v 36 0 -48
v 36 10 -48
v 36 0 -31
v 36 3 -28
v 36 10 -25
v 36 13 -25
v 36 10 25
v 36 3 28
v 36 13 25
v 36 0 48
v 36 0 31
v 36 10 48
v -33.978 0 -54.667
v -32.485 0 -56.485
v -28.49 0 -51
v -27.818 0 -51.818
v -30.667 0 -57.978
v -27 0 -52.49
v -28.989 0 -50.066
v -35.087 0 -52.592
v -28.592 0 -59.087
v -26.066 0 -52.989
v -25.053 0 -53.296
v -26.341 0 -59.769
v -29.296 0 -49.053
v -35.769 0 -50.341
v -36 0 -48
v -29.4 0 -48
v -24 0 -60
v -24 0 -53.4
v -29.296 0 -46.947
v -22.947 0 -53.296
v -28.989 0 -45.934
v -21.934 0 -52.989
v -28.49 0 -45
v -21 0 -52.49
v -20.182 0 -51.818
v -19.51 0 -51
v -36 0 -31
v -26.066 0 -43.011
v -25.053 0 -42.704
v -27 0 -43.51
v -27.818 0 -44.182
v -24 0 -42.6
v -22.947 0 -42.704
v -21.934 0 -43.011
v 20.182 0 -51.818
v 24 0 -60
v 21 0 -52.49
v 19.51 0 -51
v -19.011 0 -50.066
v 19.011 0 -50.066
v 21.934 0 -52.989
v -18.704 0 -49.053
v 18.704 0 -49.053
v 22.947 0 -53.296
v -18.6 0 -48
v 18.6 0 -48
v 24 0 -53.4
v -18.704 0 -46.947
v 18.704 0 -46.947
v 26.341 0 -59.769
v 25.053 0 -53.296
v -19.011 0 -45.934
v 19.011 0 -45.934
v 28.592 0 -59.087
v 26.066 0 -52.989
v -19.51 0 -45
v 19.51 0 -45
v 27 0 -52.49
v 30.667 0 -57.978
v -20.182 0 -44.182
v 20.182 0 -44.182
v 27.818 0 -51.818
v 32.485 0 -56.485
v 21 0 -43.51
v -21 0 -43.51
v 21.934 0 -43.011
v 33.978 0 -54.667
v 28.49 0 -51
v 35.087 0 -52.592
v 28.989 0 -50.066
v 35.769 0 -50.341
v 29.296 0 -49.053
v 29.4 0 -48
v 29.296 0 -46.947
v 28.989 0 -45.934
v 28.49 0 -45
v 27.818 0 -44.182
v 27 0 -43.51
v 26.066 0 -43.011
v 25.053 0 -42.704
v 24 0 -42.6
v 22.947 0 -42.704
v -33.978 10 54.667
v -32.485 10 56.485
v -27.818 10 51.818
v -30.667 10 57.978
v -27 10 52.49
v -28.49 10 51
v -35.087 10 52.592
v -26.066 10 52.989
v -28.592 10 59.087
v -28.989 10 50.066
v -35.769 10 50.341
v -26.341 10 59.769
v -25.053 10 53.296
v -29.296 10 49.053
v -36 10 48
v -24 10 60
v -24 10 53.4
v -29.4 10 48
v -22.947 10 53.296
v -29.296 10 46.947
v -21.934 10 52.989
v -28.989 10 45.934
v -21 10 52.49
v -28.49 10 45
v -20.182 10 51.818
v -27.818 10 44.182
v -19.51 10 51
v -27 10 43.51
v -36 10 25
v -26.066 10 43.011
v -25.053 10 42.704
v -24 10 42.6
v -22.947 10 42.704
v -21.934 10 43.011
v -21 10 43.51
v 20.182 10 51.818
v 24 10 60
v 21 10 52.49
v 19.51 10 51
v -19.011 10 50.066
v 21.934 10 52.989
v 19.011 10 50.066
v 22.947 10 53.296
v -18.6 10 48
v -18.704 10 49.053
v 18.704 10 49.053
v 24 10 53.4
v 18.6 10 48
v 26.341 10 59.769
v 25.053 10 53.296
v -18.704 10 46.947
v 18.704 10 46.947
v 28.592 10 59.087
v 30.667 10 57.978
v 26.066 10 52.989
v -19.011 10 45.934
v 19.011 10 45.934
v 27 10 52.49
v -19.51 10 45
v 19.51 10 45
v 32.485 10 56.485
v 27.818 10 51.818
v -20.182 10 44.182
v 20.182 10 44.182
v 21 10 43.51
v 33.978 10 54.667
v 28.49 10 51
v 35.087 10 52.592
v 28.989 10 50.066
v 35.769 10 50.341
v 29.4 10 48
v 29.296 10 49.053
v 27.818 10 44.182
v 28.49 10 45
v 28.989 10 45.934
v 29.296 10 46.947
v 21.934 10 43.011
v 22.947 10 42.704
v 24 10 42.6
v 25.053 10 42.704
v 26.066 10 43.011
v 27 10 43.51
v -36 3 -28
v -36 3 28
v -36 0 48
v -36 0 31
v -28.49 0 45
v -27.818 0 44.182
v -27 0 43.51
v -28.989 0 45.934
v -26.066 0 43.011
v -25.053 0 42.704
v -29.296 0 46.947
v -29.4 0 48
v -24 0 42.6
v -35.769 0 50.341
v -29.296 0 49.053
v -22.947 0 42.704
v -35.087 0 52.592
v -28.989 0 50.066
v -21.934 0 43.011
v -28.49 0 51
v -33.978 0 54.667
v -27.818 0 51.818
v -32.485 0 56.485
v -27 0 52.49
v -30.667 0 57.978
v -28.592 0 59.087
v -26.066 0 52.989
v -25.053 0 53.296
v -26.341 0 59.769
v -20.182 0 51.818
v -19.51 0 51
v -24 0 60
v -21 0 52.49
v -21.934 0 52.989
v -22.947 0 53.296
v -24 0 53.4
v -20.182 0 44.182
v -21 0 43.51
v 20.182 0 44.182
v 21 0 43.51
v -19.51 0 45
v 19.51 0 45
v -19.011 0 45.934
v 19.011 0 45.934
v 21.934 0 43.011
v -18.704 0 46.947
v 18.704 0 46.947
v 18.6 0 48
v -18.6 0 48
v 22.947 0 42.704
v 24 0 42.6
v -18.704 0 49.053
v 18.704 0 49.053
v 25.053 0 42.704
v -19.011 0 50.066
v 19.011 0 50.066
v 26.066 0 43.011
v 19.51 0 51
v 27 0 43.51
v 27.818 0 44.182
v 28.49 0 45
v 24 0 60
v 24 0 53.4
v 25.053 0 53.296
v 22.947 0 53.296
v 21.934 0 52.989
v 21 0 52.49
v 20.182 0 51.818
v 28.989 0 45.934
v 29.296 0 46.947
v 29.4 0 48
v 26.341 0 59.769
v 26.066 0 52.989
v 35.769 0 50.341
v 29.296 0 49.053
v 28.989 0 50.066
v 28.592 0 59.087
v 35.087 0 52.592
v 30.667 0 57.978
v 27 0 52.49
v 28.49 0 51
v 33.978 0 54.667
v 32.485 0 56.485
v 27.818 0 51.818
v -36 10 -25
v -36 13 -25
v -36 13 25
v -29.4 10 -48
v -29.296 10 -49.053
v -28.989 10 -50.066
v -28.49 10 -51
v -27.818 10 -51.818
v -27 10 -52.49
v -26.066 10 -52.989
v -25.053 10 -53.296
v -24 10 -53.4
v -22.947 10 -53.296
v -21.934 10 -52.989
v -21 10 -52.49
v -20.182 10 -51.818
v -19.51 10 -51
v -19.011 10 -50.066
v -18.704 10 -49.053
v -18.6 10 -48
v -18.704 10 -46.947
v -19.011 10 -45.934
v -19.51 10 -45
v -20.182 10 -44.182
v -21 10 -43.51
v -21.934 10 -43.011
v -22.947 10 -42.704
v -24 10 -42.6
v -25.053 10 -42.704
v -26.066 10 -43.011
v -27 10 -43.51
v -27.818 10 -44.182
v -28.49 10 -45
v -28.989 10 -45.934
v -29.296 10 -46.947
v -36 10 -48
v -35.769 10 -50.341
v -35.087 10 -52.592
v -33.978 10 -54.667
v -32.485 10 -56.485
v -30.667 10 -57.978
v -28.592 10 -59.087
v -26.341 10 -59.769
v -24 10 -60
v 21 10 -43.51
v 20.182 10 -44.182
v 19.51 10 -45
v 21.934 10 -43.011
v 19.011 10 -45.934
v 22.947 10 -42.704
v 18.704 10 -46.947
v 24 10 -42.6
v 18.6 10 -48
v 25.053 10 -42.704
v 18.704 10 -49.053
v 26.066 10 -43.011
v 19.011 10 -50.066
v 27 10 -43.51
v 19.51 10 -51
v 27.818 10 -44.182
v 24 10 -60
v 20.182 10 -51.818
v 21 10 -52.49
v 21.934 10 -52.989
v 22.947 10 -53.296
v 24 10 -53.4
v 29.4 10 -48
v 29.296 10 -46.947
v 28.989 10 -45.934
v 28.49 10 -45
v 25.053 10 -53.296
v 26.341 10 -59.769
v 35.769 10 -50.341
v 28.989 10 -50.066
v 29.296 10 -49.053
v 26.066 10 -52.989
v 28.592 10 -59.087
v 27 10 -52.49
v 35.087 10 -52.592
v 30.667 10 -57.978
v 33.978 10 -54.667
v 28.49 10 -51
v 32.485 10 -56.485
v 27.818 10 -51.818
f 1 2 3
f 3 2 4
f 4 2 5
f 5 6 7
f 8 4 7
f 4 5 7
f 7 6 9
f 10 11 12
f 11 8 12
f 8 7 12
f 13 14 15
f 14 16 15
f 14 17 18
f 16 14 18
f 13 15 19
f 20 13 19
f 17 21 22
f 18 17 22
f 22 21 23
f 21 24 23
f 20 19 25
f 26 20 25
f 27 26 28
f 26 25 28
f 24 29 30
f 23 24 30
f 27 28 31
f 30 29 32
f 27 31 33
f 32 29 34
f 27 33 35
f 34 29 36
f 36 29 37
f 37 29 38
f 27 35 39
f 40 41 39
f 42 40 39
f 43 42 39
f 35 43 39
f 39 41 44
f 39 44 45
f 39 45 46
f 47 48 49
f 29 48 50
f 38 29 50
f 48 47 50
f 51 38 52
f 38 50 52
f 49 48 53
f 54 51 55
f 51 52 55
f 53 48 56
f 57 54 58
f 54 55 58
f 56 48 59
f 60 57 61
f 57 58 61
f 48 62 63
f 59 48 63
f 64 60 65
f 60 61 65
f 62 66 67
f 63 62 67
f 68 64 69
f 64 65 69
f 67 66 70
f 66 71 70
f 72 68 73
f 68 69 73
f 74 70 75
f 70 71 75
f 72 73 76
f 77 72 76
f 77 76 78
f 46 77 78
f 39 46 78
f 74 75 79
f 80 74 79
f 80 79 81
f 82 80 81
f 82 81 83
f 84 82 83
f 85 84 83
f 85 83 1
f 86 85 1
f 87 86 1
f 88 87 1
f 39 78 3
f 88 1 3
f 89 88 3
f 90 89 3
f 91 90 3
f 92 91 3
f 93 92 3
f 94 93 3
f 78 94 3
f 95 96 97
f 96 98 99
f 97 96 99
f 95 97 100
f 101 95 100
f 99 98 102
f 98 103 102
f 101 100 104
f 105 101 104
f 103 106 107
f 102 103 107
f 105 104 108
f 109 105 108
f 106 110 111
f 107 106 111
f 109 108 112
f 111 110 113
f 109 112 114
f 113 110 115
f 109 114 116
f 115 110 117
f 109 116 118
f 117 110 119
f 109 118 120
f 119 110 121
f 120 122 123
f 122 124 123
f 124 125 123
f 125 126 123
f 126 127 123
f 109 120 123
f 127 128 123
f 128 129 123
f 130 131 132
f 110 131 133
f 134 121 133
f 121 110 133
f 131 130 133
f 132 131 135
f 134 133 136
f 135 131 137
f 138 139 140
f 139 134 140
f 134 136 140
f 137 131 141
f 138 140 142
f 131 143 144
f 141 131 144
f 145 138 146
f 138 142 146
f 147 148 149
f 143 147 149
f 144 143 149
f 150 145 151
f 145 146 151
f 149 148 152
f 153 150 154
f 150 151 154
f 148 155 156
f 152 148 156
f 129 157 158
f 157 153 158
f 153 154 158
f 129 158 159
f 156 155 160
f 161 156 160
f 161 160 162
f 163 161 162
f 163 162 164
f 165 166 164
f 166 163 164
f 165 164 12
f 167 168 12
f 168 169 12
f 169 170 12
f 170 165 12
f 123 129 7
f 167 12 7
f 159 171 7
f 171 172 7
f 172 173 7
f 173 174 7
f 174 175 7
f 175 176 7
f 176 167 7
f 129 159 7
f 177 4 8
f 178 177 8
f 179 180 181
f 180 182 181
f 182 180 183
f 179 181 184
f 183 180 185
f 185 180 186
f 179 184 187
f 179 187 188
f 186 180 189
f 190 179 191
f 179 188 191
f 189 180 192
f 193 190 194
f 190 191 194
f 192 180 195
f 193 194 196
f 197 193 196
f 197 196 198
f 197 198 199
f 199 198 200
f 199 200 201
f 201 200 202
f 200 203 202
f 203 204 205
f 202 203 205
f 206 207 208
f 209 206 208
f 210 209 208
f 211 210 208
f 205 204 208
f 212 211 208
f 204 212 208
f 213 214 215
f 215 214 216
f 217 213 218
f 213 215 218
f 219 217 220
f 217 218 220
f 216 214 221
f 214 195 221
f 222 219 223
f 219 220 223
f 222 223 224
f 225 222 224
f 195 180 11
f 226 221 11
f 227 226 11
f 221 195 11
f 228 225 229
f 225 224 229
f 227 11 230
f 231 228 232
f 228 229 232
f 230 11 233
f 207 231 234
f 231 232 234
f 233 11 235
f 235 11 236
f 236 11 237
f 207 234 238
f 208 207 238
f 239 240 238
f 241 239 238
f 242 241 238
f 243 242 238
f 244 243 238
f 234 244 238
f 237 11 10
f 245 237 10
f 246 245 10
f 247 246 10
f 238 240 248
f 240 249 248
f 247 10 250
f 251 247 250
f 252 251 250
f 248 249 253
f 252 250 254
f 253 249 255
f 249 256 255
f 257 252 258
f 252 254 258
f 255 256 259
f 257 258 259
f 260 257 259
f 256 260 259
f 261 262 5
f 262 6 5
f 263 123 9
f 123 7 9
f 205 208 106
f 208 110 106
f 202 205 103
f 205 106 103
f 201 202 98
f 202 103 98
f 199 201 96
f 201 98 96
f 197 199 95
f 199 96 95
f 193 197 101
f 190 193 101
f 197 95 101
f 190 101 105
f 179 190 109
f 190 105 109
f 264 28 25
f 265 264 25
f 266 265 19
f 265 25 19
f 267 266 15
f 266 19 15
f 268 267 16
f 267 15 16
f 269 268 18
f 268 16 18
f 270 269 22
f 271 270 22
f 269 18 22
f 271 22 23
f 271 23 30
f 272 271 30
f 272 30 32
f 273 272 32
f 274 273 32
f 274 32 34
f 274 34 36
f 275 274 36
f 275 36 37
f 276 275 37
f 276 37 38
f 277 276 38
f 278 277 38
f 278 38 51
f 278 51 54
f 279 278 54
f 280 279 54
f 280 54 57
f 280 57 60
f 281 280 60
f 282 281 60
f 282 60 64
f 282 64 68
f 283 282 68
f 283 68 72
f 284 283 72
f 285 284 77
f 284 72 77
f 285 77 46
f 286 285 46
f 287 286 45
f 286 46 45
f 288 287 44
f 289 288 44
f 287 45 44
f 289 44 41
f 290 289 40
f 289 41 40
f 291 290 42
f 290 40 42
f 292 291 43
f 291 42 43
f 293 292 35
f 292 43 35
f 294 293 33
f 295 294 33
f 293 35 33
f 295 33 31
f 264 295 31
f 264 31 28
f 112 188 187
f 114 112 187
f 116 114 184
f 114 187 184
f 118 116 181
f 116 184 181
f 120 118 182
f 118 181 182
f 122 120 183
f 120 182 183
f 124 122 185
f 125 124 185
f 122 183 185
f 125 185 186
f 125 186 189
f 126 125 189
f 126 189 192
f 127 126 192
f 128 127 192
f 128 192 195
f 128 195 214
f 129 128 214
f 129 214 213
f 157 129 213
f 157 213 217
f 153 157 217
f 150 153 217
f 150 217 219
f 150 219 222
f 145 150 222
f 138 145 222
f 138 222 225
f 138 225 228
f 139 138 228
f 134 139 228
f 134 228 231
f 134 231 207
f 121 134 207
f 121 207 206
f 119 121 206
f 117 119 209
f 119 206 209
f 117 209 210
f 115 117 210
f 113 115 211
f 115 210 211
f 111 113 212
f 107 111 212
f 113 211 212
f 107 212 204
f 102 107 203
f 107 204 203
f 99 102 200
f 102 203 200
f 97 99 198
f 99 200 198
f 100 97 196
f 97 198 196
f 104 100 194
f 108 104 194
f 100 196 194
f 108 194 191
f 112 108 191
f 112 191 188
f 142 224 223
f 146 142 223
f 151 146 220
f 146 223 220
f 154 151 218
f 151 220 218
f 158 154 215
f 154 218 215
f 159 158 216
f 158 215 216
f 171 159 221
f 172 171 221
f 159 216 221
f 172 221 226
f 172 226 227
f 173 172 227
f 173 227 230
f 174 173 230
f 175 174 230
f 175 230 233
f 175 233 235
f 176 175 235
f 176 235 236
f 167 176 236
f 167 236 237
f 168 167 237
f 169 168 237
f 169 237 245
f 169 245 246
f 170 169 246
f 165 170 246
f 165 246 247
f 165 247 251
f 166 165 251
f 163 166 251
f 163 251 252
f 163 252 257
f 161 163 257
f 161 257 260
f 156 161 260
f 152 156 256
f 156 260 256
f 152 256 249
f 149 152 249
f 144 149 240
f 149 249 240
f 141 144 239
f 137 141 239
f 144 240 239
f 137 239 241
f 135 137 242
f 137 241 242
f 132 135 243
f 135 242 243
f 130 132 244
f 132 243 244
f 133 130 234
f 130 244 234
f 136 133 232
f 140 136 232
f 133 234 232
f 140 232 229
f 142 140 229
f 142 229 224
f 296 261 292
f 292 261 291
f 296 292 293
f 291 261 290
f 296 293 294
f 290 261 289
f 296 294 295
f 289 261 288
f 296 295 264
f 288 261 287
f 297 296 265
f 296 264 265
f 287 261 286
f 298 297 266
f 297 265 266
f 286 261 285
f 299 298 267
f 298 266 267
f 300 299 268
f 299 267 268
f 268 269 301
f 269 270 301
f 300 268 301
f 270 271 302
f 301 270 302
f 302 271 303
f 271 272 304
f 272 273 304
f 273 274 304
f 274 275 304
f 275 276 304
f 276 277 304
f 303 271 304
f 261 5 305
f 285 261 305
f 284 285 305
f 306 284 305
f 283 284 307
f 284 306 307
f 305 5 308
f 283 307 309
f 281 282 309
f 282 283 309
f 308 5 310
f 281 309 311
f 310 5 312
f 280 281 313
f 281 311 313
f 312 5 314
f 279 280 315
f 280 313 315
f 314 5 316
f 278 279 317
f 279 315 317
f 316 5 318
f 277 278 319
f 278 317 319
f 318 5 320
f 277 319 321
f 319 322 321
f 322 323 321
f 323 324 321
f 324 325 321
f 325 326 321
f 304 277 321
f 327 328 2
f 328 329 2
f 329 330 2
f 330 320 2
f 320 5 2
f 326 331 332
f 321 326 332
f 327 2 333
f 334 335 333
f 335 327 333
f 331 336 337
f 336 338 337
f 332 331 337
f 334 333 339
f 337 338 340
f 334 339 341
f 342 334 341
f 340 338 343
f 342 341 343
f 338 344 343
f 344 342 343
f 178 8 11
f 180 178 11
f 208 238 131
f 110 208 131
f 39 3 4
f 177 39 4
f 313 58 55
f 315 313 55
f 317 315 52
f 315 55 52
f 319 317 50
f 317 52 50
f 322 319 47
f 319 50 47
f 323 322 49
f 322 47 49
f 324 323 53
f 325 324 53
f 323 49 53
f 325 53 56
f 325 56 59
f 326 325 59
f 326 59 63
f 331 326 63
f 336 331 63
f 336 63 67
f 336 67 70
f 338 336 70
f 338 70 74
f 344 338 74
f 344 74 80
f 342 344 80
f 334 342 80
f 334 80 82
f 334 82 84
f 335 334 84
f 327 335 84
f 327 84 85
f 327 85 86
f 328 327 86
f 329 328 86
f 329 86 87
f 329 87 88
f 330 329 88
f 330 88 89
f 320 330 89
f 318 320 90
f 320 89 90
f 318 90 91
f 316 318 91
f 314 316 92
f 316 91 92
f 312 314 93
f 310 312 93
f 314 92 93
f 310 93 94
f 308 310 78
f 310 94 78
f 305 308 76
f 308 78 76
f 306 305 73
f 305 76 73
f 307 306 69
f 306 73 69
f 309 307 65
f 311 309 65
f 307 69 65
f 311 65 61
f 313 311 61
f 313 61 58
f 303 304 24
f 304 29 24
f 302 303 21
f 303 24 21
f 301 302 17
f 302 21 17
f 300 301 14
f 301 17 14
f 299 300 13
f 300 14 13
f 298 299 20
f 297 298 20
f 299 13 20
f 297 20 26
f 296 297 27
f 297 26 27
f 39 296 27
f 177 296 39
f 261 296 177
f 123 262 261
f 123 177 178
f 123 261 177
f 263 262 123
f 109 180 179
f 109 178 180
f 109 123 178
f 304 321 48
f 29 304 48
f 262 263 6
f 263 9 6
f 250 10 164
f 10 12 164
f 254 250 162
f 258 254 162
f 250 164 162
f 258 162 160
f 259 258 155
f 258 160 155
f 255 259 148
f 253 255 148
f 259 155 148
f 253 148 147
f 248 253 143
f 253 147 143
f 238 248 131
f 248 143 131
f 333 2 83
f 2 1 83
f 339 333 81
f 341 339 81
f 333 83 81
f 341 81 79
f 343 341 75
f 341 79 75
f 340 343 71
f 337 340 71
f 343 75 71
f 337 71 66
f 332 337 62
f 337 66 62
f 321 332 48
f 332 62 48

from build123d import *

# Parameters (mm, degrees)
BOSS_EXTRUDE1_DEPTH     = 36
FILLET1_R               = 12
M12X1_25_TAPPED_HOLE1_D = 10.8


with BuildPart() as part:
    # Sketch1 → Boss-Extrude1 (new, symmetric)
    with BuildSketch(Plane(origin=(0, 0, 0), x_dir=(0, 0, -1), z_dir=(1, 0, 0))):
        Polygon((-28, 3), (-31, 0), (-60, 0), (-60, 10), (-25, 10), (-25, 13), (25, 13), (25, 10), (60, 10), (60, 0), (31, 0), (28, 3), align=None)
    extrude(amount=BOSS_EXTRUDE1_DEPTH, both=True)

    # Fillet1
    fillet1_edges = [part.edges().sort_by_distance(p)[0] for p in [
        (-36, 5, 60),
        (-36, 5, -60),
        (36, 5, -60),
        (36, 5, 60),
    ]]
    fillet(fillet1_edges, radius=FILLET1_R)

    # M12x1.25 Tapped Hole1 (through all)
    with Locations(Plane(origin=(0, 10, 0), x_dir=(1, 0, 0), z_dir=(0, 1, 0))):
        with Locations((24, -48), (-24, -48), (24, 48), (-24, 48)):
            Hole(M12X1_25_TAPPED_HOLE1_D / 2)


solid = part.part
